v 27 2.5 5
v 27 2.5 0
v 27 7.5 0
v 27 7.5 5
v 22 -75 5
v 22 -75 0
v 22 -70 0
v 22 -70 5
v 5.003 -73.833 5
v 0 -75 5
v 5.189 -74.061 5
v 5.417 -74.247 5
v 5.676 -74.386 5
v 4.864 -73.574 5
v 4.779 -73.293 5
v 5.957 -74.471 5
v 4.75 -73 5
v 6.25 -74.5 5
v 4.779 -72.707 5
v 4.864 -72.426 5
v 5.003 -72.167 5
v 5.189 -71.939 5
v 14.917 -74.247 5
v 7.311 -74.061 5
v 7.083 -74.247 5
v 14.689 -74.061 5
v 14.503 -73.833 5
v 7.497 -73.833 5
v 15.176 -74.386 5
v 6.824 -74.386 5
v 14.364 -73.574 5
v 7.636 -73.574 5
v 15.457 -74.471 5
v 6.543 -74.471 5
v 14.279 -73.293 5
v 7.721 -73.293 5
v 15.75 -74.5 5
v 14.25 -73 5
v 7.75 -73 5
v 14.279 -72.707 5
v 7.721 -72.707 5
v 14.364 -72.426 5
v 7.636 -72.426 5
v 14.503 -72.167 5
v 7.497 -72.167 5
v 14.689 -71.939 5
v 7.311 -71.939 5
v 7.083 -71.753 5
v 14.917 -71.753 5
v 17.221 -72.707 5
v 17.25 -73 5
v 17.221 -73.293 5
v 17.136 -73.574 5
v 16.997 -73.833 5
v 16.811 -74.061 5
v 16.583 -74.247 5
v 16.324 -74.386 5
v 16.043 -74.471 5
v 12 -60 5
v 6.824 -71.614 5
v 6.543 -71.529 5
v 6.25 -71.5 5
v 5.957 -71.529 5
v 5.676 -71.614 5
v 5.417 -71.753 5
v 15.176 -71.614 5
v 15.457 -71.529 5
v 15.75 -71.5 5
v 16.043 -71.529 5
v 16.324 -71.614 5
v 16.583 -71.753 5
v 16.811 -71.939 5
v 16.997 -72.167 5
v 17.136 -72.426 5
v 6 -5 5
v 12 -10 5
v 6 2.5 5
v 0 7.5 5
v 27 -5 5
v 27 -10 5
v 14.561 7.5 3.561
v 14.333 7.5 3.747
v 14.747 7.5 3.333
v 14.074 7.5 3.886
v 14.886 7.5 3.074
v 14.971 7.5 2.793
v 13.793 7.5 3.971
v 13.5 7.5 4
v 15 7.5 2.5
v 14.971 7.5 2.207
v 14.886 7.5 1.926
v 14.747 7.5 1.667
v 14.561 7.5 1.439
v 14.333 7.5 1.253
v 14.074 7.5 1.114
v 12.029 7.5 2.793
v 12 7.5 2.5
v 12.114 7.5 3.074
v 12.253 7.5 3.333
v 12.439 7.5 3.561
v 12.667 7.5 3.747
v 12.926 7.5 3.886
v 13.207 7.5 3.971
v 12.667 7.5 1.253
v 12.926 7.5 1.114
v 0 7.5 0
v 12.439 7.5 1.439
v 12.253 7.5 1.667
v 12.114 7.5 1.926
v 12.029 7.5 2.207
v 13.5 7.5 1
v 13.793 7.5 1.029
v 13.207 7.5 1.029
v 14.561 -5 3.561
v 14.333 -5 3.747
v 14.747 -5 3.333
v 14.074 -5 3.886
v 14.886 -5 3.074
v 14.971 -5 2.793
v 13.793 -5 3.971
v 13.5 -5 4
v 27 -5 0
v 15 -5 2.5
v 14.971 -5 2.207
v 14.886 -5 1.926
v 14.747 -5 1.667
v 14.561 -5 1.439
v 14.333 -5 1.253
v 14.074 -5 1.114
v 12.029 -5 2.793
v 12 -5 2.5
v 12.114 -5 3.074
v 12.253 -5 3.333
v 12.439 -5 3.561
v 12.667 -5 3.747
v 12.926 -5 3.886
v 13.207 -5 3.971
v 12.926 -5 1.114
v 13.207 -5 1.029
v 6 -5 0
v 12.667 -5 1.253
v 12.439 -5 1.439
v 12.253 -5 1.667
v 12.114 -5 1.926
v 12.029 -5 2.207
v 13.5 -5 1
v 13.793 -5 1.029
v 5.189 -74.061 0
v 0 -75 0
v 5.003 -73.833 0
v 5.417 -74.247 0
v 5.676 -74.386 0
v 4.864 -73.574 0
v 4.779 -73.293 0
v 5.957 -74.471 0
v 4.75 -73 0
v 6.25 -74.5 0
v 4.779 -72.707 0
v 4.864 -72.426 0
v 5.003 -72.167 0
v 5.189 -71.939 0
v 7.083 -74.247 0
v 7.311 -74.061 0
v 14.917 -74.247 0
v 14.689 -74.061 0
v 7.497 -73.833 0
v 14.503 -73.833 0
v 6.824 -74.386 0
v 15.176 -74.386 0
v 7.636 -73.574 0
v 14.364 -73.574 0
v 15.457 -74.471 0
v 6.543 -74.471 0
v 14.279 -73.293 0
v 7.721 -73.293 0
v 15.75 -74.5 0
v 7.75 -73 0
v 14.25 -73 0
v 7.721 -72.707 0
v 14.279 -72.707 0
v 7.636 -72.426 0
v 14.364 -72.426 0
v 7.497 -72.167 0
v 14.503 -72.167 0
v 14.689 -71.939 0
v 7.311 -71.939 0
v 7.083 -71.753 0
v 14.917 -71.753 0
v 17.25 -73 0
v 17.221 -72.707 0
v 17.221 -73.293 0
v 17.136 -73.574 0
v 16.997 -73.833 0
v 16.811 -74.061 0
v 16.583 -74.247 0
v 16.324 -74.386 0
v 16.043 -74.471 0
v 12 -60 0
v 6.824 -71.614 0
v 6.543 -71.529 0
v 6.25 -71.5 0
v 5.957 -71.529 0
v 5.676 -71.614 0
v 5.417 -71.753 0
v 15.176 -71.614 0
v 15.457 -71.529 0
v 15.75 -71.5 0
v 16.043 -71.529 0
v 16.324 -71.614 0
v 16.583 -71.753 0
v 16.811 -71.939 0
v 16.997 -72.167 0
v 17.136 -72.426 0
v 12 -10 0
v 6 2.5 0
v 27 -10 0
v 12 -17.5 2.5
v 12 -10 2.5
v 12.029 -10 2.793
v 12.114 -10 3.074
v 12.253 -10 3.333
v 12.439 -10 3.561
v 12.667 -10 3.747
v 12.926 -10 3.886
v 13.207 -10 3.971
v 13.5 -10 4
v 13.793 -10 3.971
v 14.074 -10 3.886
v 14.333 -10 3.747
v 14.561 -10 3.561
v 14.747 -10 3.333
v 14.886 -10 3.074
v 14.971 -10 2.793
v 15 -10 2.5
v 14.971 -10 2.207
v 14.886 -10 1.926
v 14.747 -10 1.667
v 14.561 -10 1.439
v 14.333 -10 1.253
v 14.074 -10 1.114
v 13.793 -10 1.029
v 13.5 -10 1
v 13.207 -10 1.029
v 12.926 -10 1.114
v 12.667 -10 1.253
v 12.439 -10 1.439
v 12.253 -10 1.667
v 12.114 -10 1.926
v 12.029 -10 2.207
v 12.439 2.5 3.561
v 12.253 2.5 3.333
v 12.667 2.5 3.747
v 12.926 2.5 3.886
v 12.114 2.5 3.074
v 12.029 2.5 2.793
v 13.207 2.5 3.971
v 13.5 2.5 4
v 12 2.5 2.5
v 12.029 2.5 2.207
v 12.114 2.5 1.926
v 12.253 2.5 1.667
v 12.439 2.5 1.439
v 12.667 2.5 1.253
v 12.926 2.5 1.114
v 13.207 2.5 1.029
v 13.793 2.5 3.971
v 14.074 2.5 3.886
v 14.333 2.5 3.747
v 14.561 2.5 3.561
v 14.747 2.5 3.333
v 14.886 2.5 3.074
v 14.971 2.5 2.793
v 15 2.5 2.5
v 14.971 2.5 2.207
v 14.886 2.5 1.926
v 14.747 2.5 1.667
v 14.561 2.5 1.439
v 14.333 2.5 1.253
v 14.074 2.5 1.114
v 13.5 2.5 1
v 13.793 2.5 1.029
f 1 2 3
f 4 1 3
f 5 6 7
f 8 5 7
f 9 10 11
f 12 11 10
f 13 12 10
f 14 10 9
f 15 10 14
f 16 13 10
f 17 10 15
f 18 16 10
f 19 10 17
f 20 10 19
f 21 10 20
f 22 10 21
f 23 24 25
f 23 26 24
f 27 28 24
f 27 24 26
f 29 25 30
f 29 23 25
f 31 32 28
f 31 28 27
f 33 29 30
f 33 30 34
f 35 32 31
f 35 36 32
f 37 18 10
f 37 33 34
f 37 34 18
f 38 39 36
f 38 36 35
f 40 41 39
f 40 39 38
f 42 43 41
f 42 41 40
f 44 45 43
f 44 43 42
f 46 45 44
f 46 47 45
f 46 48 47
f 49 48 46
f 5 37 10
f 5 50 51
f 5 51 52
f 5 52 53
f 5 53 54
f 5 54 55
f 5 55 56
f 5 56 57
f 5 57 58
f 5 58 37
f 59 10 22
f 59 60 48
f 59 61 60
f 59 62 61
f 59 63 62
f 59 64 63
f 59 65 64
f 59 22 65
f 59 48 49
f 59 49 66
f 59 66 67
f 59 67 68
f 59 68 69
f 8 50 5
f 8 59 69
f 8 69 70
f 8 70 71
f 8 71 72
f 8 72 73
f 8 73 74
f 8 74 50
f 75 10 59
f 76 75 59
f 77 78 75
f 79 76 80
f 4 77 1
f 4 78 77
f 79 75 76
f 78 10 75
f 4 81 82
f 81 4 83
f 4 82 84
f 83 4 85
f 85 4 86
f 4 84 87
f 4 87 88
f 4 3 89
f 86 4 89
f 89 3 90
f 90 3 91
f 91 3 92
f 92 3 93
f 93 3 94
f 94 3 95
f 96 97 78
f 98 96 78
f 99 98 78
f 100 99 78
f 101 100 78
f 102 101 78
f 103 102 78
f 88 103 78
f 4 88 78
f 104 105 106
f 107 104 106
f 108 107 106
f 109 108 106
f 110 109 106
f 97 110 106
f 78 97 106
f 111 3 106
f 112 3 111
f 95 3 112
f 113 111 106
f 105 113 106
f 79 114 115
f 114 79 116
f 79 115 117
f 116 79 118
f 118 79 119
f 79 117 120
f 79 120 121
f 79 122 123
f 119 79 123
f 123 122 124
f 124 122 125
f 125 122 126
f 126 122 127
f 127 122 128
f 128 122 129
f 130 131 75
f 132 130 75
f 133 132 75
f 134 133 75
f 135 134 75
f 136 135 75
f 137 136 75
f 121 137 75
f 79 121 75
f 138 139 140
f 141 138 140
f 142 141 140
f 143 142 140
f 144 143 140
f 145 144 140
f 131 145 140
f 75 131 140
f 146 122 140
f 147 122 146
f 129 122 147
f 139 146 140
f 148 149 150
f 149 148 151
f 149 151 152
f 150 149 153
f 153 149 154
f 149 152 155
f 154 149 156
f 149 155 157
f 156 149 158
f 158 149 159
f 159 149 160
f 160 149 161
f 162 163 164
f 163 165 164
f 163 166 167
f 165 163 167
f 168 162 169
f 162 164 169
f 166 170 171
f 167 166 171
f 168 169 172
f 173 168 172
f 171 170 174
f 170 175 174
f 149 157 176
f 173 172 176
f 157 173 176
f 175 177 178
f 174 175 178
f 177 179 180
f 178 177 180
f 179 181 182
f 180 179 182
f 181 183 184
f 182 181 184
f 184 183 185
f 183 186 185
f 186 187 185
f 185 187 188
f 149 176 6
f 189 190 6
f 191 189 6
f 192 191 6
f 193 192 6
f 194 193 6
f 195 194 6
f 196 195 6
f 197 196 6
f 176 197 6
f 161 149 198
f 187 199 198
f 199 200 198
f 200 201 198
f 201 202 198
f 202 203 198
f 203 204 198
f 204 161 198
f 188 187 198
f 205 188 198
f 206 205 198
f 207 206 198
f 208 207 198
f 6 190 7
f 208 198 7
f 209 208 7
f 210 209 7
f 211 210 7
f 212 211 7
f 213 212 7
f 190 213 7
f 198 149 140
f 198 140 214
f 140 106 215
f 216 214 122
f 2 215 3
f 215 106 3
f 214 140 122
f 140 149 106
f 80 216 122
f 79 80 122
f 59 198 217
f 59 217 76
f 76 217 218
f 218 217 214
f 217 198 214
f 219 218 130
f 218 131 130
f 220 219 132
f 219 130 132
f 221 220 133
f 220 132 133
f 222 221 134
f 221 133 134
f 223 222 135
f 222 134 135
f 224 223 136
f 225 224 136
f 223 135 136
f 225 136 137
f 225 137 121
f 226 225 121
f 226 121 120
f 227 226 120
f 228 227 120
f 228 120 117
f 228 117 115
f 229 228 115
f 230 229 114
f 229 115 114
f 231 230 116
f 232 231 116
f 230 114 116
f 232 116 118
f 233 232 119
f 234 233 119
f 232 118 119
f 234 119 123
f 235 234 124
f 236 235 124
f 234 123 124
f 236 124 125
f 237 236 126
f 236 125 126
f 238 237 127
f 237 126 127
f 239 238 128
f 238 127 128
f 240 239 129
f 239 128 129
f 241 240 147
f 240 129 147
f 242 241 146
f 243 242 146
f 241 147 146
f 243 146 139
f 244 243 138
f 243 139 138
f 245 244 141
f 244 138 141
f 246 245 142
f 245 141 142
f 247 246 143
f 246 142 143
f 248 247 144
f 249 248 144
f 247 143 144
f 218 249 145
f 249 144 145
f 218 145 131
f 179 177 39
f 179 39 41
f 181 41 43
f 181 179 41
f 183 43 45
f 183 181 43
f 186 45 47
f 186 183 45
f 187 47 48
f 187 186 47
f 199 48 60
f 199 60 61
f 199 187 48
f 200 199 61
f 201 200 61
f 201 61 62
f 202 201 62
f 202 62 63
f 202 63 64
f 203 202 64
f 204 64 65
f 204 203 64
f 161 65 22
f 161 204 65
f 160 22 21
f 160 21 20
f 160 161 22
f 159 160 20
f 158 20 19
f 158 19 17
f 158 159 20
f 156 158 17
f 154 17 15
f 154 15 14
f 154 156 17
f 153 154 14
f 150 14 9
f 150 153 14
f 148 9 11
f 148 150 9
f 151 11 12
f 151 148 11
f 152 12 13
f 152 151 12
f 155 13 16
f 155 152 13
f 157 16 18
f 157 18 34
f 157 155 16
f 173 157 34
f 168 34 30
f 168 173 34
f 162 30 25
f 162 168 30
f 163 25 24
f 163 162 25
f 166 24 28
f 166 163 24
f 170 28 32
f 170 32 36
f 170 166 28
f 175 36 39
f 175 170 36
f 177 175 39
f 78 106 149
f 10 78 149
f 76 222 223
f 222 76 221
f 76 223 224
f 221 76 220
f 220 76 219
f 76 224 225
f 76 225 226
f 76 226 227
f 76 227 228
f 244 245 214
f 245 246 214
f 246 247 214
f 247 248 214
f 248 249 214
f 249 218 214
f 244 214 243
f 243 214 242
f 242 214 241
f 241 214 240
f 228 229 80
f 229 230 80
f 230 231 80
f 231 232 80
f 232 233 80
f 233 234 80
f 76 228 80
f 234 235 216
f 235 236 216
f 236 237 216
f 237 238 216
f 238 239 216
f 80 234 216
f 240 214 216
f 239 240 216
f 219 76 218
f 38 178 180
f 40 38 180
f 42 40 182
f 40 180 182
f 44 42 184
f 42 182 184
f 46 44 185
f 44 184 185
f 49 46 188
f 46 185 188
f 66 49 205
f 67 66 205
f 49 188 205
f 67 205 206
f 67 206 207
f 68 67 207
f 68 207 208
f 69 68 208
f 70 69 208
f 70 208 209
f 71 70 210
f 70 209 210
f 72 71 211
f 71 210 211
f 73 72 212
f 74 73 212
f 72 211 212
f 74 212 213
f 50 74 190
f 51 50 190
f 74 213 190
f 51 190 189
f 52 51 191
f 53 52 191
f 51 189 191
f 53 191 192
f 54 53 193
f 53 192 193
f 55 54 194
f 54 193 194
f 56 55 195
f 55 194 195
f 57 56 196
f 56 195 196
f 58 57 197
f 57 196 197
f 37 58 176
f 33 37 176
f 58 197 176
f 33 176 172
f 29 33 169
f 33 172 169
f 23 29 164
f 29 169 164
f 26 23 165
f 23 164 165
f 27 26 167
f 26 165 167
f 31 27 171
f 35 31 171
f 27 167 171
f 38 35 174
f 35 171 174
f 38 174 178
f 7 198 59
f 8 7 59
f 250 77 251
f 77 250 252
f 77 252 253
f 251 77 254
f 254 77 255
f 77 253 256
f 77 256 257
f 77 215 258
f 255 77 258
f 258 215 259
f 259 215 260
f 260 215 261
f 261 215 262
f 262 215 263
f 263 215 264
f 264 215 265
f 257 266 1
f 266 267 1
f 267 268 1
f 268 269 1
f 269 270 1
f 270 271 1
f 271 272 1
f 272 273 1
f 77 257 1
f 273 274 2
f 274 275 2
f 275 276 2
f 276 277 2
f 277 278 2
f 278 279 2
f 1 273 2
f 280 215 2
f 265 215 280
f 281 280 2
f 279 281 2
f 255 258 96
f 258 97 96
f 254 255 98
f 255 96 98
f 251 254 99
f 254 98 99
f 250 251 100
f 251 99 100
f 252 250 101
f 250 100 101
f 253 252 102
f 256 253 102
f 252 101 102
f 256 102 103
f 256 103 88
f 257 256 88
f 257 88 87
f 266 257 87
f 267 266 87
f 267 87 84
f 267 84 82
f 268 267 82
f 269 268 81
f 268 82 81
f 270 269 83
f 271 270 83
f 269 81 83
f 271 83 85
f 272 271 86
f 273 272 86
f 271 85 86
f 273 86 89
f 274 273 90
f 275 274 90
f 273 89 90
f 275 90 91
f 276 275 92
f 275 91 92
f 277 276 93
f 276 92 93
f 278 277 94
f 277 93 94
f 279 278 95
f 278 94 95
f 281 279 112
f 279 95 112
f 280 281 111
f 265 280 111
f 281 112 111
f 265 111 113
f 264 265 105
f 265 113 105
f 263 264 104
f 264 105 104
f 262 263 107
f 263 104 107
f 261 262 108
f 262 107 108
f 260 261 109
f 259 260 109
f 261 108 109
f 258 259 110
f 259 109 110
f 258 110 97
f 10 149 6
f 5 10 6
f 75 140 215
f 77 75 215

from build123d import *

# Parameters (mm, degrees)
F0_R     = 1.5
F1_DEPTH = 5
F2_SIZE  = 9.99999
F4_DEPTH = 25


# Not quite as in the source:
# - a fillet or chamfer is up to 0.001 mm smaller than in the source, because OpenCascade refuses the exact size


with BuildPart() as f1:
    # F0 (on Top) → F1 (new body)
    with BuildSketch(Plane.XY):
        Polygon((0, 7.5), (0, 0), (0, -75), (11, -75), (22, -75), (22, -60), (12, -60), (12, -10), (27, -10), (27, -5), (6, -5), (6, 2.5), (27, 2.5), (27, 7.5), align=None)
        with Locations((6.25, -73)):
            Circle(F0_R, mode=Mode.SUBTRACT)
        with BuildLine():
            ThreePointArc((17.25, -73), (15.75, -74.5), (14.25, -73))
            ThreePointArc((14.25, -73), (15.75, -71.5), (17.25, -73))
        make_face(mode=Mode.SUBTRACT)
    extrude(amount=F1_DEPTH)

    # F2 (size 10 in the source; OpenCascade refuses exactly that, so slightly less here)
    f2_edges = [f1.edges().sort_by_distance(p)[0] for p in [
        (22, -60, 2.5),
    ]]
    chamfer(f2_edges, length=F2_SIZE)

    # F3 (on face) → F4 (cut)
    with BuildSketch(Plane(origin=(0, 7.5, 0), x_dir=(-1, 0, 0), z_dir=(0, 1, 0))):
        with BuildLine():
            ThreePointArc((-15, 2.5), (-13.5, 1), (-12, 2.5))
            Line((-12, 2.5), (-15, 2.5))
        make_face()
        with BuildLine():
            Line((-15, 2.5), (-12, 2.5))
            ThreePointArc((-12, 2.5), (-13.5, 4), (-15, 2.5))
        make_face()
    extrude(amount=-F4_DEPTH, mode=Mode.SUBTRACT)


solid = f1.part
